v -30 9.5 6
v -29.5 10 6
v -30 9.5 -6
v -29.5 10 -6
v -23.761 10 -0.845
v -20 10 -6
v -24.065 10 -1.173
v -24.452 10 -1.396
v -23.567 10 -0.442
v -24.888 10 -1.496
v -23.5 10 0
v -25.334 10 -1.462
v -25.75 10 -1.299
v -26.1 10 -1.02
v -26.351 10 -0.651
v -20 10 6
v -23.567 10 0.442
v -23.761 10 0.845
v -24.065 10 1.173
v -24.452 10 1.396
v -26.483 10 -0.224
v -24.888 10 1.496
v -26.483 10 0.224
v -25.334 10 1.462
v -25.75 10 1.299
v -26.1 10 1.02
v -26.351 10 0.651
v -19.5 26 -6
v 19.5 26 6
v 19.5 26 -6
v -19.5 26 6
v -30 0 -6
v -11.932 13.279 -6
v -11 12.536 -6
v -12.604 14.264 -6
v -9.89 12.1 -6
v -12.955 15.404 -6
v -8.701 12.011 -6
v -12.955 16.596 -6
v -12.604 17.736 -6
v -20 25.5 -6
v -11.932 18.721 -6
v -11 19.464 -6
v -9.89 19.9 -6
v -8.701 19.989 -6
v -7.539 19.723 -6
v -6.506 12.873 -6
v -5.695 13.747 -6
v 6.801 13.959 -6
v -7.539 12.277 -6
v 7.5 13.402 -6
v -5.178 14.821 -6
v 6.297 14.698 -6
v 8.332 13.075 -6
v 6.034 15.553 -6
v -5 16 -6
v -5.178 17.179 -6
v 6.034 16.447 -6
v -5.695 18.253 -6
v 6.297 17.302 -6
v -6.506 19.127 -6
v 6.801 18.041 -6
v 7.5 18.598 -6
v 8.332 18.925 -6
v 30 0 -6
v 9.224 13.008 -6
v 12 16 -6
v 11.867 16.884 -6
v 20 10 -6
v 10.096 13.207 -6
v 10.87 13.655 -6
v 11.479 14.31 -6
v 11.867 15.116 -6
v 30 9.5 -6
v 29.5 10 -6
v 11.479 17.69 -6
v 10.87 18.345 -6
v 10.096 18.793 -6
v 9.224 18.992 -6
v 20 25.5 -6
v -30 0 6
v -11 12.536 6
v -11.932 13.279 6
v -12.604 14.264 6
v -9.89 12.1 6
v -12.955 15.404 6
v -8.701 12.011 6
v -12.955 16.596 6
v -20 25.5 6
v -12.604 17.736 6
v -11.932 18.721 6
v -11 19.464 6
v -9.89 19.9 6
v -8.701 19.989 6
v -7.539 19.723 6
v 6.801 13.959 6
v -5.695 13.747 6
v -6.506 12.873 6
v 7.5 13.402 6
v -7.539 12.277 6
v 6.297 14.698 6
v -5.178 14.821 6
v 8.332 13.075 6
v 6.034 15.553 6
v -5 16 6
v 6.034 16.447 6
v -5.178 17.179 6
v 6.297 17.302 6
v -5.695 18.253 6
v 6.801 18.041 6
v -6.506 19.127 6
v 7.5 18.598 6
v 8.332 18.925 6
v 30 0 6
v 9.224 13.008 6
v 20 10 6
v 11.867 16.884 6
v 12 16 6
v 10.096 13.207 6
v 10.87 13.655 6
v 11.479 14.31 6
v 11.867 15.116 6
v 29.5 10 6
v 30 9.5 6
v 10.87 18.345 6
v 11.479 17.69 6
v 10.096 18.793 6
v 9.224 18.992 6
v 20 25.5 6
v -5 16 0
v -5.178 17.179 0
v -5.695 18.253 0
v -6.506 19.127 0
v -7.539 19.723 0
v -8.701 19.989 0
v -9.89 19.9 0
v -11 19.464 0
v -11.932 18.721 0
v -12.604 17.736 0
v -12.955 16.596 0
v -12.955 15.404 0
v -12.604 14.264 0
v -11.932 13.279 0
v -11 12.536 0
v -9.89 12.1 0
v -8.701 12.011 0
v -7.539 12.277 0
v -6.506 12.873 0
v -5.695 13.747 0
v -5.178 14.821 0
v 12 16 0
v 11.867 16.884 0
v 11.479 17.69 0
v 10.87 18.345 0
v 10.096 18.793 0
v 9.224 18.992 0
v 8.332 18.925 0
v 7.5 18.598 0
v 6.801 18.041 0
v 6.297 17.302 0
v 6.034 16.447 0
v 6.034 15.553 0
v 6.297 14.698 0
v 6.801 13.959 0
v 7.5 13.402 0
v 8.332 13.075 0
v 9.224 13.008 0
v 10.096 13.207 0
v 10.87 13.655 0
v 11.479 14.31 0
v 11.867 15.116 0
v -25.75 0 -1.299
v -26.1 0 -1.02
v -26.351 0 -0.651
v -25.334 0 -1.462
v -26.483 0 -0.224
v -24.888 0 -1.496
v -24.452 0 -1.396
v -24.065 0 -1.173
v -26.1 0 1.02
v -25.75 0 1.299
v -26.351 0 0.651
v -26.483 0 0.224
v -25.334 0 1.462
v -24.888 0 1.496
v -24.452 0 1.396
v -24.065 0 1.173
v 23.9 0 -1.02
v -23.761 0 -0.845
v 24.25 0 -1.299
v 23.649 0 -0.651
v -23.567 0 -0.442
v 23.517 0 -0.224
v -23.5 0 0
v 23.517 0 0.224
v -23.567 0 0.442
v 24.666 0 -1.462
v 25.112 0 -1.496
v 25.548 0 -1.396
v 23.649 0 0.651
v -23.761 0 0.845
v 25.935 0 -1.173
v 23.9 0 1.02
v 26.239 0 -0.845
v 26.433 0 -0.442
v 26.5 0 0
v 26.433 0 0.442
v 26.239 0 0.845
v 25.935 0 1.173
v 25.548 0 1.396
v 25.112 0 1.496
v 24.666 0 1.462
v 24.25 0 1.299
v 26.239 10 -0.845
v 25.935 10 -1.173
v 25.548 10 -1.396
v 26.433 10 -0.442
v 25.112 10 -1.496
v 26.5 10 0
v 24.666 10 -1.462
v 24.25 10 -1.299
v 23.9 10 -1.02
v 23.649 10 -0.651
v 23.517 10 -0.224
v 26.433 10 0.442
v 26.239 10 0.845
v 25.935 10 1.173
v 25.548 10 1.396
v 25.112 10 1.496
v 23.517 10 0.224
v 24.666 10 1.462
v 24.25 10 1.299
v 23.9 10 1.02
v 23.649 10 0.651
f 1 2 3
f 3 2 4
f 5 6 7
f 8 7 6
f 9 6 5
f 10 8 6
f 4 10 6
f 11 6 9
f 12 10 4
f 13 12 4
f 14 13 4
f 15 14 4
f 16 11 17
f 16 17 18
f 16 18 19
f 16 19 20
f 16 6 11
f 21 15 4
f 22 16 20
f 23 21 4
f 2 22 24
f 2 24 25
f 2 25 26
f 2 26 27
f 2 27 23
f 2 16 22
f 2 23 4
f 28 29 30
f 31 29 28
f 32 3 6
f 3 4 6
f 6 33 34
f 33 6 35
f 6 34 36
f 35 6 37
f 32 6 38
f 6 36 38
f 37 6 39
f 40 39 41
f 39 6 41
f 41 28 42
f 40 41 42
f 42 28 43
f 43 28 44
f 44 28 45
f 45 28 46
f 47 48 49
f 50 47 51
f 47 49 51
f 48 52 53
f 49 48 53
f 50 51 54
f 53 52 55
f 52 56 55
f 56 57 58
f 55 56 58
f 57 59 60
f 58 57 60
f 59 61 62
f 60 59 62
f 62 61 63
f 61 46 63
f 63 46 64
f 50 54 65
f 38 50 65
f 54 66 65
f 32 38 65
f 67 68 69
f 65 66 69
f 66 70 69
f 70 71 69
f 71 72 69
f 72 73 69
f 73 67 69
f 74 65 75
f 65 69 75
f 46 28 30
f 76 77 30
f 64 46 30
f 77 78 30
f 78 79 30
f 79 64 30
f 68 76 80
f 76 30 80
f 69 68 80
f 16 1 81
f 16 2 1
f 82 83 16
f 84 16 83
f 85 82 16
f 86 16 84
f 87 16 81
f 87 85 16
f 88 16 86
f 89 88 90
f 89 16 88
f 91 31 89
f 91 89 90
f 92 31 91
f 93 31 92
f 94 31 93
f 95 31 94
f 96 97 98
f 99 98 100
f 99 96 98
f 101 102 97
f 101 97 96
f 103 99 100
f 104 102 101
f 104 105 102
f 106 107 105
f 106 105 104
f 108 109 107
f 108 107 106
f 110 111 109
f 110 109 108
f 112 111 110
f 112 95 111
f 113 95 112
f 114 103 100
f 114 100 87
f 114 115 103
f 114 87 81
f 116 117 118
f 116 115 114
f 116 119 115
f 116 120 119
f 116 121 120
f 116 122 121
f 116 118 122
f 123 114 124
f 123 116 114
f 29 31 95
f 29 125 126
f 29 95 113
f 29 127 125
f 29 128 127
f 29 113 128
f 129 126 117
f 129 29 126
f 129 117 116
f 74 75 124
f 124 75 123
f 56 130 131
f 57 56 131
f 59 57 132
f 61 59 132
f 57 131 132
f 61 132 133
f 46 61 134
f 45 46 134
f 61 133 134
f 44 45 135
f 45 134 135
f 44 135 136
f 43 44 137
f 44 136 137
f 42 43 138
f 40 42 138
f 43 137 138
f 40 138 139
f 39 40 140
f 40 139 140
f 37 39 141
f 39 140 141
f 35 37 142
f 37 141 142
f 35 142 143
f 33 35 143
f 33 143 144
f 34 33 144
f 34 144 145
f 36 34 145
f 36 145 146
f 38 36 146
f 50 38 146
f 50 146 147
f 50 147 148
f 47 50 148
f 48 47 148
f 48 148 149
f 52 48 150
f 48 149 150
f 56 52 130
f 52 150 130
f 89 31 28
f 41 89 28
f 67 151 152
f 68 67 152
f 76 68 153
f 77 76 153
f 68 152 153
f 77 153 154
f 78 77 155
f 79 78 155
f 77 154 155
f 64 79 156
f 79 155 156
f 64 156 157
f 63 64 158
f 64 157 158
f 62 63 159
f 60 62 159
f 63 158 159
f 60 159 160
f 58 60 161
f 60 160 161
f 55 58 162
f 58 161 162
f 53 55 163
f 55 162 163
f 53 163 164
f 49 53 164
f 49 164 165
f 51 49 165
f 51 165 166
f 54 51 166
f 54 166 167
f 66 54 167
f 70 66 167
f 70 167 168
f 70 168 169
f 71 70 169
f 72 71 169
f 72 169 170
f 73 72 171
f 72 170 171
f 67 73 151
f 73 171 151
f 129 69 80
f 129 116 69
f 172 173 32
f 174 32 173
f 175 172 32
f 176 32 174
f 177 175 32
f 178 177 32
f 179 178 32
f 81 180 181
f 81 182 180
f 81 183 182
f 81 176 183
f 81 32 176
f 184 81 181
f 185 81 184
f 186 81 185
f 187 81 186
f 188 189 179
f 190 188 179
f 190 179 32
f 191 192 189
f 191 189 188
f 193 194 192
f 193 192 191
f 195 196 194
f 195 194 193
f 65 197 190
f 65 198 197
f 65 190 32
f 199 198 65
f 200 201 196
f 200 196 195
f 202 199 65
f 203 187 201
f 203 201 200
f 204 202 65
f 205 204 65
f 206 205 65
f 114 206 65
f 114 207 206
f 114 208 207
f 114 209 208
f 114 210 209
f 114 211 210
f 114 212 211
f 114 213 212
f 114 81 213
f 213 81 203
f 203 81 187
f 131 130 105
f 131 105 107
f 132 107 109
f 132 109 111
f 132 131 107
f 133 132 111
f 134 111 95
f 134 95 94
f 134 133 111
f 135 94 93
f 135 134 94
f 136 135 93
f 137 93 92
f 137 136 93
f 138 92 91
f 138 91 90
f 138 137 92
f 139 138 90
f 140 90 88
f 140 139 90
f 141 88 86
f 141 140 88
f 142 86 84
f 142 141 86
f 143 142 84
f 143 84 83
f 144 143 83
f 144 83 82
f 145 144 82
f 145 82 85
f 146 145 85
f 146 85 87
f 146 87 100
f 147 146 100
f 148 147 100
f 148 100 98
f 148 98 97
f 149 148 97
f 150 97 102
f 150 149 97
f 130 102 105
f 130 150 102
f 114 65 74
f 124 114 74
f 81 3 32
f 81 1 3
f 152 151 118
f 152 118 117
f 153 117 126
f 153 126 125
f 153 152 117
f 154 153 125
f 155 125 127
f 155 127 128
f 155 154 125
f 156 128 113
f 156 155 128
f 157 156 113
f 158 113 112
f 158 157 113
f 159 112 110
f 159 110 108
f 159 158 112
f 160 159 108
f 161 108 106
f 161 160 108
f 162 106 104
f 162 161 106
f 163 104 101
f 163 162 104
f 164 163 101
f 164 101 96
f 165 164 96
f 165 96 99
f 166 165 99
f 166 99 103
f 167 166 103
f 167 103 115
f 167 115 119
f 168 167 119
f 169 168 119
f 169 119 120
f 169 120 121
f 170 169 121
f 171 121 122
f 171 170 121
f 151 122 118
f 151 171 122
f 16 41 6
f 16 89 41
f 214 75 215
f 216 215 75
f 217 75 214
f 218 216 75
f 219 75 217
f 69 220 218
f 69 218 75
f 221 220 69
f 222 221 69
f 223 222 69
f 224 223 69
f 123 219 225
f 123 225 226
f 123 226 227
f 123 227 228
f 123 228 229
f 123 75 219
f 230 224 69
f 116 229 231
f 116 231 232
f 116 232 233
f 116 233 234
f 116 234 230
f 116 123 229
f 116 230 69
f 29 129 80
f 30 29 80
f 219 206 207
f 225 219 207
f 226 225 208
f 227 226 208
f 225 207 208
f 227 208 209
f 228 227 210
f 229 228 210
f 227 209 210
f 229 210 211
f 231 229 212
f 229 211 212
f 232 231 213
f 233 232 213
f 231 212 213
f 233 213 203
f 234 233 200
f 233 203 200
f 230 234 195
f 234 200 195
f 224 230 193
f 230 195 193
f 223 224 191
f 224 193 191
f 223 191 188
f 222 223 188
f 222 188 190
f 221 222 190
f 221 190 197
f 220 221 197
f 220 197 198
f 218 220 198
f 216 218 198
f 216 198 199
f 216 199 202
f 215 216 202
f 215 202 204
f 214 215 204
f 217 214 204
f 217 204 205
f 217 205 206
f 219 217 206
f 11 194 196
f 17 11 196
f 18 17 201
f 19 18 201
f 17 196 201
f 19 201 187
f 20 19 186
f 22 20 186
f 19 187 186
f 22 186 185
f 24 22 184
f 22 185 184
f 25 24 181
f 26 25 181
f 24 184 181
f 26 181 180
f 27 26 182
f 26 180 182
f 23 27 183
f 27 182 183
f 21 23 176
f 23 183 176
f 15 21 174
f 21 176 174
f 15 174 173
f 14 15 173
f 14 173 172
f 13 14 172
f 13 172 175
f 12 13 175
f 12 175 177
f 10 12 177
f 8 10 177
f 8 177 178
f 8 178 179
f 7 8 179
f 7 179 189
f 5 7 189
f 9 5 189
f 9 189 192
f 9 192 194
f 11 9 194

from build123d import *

# Parameters (mm, degrees)
F0_R          = 4
F0_R_2        = 3
F1_DEPTH      = 6
F1_DEPTH_BACK = 6
F2_R          = 1.5
F3_DEPTH      = 26.001
F4_SIZE       = 0.5


with BuildPart() as f1:
    # F0 (on Top) → F1 (new body, two sides)
    with BuildSketch(Plane.XY) as f1_sk:
        Polygon((-30, 10), (-30, 0), (30, 0), (30, 10), (20, 10), (20, 26), (-20, 26), (-20, 10), align=None)
        with Locations((-9, 16)):
            Circle(F0_R, mode=Mode.SUBTRACT)
        with Locations((9, 16)):
            Circle(F0_R_2, mode=Mode.SUBTRACT)
    extrude(amount=F1_DEPTH)
    extrude(f1_sk.sketch, amount=-F1_DEPTH_BACK)

    # F2 (on face) → F3 (cut, through all)
    with BuildSketch(Plane.XZ):
        with Locations((-25, 0)):
            Circle(F2_R)
        with Locations((25, 0)):
            Circle(F2_R)
    extrude(amount=-F3_DEPTH, mode=Mode.SUBTRACT)

    # F4
    f4_edges = [f1.edges().sort_by_distance(p)[0] for p in [
        (-20, 26, 0),
        (20, 26, 0),
        (30, 10, 0),
        (-30, 10, 0),
    ]]
    chamfer(f4_edges, length=F4_SIZE)


solid = f1.part
